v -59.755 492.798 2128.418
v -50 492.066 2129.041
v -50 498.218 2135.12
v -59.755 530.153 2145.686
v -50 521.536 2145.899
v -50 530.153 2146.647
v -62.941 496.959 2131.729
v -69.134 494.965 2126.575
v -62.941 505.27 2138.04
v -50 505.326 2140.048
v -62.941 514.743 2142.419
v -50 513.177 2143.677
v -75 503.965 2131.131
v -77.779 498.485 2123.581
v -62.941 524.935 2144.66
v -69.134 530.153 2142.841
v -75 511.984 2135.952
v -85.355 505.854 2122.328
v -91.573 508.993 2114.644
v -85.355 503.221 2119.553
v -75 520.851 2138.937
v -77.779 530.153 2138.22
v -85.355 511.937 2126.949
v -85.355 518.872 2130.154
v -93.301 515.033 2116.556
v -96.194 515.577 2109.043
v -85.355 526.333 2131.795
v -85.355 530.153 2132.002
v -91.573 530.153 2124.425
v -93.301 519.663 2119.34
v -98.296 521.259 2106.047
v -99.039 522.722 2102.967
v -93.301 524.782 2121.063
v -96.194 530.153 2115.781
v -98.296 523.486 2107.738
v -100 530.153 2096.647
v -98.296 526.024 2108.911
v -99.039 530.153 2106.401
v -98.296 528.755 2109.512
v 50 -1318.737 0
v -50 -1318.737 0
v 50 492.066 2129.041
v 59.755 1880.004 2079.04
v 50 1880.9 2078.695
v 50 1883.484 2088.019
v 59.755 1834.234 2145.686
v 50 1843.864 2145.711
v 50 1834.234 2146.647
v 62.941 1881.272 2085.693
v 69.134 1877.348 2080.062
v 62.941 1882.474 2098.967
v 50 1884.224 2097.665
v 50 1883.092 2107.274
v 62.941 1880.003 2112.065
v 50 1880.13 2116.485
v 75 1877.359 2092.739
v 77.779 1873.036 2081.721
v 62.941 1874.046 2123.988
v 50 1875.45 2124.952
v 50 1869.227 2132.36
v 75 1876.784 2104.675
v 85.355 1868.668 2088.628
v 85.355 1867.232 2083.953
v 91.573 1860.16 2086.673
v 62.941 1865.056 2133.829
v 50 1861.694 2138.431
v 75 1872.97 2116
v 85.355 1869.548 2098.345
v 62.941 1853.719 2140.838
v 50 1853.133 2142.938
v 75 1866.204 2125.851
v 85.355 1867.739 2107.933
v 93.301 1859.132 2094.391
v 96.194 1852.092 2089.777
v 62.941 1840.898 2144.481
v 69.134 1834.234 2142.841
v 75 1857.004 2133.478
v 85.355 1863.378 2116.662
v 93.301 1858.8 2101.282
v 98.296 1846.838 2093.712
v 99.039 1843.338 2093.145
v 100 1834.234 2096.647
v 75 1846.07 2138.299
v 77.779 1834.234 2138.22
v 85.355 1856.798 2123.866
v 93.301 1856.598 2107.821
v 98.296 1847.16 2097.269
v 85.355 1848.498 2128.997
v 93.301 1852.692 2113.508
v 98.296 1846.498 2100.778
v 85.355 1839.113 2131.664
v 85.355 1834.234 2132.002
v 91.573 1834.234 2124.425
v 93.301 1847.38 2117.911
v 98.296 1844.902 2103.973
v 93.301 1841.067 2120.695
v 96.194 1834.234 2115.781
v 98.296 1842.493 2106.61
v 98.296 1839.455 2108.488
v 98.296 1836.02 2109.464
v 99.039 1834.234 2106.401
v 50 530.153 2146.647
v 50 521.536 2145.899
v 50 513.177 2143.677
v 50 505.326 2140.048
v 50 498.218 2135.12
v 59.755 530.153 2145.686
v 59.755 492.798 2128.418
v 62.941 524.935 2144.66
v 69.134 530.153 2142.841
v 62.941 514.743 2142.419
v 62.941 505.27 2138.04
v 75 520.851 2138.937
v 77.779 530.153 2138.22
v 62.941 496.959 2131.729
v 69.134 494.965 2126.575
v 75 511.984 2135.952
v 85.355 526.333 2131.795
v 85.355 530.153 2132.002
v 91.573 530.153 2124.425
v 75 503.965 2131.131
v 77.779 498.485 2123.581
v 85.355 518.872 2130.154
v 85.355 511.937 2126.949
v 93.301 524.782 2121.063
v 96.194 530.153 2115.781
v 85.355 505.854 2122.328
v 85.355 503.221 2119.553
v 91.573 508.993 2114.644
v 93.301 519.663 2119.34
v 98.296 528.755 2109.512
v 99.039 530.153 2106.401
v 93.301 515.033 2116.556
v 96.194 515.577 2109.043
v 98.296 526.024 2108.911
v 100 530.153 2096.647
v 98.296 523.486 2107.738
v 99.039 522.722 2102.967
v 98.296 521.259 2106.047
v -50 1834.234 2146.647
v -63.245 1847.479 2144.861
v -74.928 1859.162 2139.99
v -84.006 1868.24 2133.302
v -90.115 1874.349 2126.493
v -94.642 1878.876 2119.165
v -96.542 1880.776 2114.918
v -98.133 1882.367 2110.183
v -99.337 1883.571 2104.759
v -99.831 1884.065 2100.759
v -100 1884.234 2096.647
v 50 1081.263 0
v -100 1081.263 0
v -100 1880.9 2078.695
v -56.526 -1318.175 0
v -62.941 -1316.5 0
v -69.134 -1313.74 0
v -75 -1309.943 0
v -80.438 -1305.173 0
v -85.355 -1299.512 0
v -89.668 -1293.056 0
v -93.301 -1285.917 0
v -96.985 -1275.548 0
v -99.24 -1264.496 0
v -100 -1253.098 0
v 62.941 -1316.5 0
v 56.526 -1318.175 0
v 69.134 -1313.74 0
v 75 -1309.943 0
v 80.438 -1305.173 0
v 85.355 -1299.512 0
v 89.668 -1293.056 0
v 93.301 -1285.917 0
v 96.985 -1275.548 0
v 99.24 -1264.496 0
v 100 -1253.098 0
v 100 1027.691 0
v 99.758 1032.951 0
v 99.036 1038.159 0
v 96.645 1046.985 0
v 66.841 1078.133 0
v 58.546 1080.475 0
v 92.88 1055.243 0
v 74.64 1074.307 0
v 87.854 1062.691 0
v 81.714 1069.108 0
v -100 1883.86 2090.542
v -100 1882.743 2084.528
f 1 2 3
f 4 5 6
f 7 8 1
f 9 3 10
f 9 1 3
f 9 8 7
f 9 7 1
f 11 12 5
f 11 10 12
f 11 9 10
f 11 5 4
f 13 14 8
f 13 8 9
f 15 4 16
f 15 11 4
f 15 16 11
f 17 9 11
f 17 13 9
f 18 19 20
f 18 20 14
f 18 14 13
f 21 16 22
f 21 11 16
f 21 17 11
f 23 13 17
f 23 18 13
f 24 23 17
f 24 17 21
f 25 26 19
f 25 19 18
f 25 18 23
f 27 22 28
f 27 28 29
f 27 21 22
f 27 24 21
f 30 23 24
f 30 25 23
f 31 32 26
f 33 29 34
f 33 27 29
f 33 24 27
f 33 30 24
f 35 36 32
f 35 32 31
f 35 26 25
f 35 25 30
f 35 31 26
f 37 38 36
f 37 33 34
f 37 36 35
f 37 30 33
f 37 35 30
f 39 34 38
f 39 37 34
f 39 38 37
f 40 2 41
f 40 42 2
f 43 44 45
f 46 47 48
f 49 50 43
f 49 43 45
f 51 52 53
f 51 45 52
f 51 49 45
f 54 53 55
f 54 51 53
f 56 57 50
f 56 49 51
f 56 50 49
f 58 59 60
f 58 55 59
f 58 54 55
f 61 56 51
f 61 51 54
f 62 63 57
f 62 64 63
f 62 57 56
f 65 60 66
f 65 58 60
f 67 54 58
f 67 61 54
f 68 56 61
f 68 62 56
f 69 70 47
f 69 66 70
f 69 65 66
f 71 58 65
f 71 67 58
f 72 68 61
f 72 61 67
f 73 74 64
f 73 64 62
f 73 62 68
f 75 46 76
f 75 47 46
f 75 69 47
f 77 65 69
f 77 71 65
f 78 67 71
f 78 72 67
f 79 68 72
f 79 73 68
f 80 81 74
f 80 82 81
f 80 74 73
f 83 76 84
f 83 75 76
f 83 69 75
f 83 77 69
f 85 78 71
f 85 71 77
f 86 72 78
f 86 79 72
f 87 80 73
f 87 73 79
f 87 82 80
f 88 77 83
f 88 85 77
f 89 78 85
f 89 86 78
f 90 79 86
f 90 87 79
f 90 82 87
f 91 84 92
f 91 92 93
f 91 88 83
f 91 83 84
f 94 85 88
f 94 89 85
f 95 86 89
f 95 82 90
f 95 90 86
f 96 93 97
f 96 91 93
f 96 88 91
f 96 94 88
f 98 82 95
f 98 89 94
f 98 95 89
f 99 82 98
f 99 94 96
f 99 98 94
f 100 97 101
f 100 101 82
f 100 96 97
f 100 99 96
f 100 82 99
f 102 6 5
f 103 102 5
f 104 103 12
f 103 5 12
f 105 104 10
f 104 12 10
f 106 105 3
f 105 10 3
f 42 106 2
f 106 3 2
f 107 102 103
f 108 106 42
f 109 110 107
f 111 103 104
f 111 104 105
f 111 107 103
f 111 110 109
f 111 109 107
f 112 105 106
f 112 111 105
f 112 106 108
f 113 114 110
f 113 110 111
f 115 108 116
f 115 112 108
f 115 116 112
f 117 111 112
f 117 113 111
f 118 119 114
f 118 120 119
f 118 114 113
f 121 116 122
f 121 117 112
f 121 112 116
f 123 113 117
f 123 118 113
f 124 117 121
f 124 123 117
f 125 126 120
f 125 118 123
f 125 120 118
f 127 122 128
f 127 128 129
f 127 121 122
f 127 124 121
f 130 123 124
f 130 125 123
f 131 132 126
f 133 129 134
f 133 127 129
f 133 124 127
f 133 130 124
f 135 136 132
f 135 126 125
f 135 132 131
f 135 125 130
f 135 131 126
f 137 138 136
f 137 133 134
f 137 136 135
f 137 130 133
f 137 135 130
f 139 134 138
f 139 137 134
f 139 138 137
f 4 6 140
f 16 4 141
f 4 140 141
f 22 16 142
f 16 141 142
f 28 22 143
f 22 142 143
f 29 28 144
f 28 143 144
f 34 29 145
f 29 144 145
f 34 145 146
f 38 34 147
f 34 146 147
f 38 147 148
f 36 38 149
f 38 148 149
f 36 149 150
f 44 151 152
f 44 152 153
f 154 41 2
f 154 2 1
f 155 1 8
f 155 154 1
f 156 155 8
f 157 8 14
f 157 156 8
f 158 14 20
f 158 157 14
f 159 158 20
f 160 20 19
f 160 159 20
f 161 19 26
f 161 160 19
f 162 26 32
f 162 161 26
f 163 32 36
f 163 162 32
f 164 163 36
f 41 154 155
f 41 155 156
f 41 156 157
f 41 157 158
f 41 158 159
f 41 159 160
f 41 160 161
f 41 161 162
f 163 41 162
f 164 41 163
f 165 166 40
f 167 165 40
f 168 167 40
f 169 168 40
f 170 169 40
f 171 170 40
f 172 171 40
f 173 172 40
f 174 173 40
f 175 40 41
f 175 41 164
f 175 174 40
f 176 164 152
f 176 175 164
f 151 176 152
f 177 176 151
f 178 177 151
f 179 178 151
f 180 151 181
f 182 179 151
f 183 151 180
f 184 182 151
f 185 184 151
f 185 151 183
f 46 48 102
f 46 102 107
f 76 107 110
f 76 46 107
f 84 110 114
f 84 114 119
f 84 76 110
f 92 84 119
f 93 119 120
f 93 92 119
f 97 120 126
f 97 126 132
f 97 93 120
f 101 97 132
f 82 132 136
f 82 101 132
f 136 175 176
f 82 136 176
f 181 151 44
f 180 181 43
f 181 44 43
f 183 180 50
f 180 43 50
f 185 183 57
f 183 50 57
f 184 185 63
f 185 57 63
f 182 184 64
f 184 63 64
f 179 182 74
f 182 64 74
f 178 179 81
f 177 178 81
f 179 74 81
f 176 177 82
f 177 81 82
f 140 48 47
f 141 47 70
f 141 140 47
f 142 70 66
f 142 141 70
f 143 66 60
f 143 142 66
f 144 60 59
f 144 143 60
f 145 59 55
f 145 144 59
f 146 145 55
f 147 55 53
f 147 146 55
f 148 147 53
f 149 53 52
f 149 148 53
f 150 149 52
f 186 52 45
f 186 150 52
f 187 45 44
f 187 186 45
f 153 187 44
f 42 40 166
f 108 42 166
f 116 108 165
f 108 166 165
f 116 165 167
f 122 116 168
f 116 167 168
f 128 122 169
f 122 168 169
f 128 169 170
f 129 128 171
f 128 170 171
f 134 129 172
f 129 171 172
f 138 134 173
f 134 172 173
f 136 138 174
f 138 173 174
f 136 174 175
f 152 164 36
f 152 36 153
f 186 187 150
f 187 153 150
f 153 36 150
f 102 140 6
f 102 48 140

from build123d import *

# Parameters (mm, degrees)
F2_DEPTH     = 100
F3_R         = 50
F4_T1_DEPTH  = 1304.0811873082
F4_T3_DEPTH  = 1501.8872234652
F4_T5_DEPTH  = 332.0150903927
F4_T7_DEPTH  = 100
F4_T12_DEPTH = 50
F4_T18_DEPTH = 50
F4_T24_DEPTH = 50


# Not quite as in the source:
# - a fillet or chamfer that OpenCascade refuses, or shapes differently, is made with other operations: its cross-section is extruded or revolved along the edge and cut away or added


with BuildPart() as f2:
    # F0 (on Right) → F2 (new body, symmetric)
    with BuildSketch(Plane.YZ):
        Polygon((507.0400096967, 2146.646806384), (-1318.7368903443, 0), (1081.2631096557, 0), (1907.0400096967, 2146.646806384), align=None)
    extrude(amount=F2_DEPTH, both=True)

    # F3
    f3_edges = [f2.edges().sort_by_distance(p)[0] for p in [
        (-100, -405.84844, 1073.323403),
        (100, -405.84844, 1073.323403),
        (100, 1494.15156, 1073.323403),
    ]]
    fillet(f3_edges, radius=F3_R)

    # F4: fillet of radius 50 on 4 edges, made by hand

    # F4_s2 → F4_t1 (cut)
    with BuildSketch(Plane.XZ.offset(-1834.2339735396)):
        with BuildLine():
            ThreePointArc((50, 2146.646806384), (85.3553390593, 2132.0021454433), (100, 2096.646806384))
            Line((100, 2096.646806384), (100, 2146.646806384))
            Line((100, 2146.646806384), (50, 2146.646806384))
        make_face()
    extrude(amount=F4_T1_DEPTH, mode=Mode.SUBTRACT)

    # F4_s4 → F4_t3 (cut)
    with BuildSketch(Plane.XZ.offset(-2032.0400096967)):
        with BuildLine():
            ThreePointArc((-50, 2146.646806384), (-85.3553390593, 2132.0021454433), (-100, 2096.646806384))
            Line((-100, 2096.646806384), (-100, 2146.646806384))
            Line((-100, 2146.646806384), (-50, 2146.646806384))
        make_face()
    extrude(amount=F4_T3_DEPTH, mode=Mode.SUBTRACT)

    # F4_s6 → F4_t5 (cut)
    with BuildSketch(Plane.YZ.offset(-282.0150903927)):
        with BuildLine():
            ThreePointArc((1834.2339735396, 2146.646806384), (1875.4503755357, 2124.9524278487), (1880.900208461, 2078.695134644))
            Line((1880.900208461, 2078.695134644), (1907.0400096967, 2146.646806384))
            Line((1907.0400096967, 2146.646806384), (1834.2339735396, 2146.646806384))
        make_face()
    extrude(amount=F4_T5_DEPTH, mode=Mode.SUBTRACT)

    # F4_s8 → F4_t7 (cut)
    with BuildSketch(Plane.YZ.offset(-50)):
        with BuildLine():
            ThreePointArc((530.1527862314, 2146.646806384), (509.1730515679, 2142.0323848583), (492.0656904737, 2129.0408357219))
            Line((492.0656904737, 2129.0408357219), (507.0400096967, 2146.646806384))
            Line((507.0400096967, 2146.646806384), (530.1527862314, 2146.646806384))
        make_face()
    extrude(amount=F4_T7_DEPTH, mode=Mode.SUBTRACT)


with BuildPart() as f4_tool10:
    # F4_s11 → F4_t12 (new body)
    with BuildSketch(Plane.YZ.offset(-50)):
        Polygon((530.1527862314, 2096.646806384), (492.0656904737, 2129.0408357219), (507.0400096967, 2146.646806384), (530.1527862314, 2146.646806384), align=None)
    extrude(amount=-F4_T12_DEPTH)

    # F4_s13 → F4_t14 (revolve, cut)
    with BuildSketch(Plane(origin=(-50, 530.1527862314, 2096.646806384), x_dir=(0, 0.4195946933, -0.9077115695), z_dir=(0, 0.9077115695, 0.4195946933))):
        with BuildLine():
            ThreePointArc((0, -50), (50, 0), (0, 50))
            Line((0, 50), (0, -50))
        make_face()
    revolve(axis=Axis((-50, 530.1527862314, 2096.646806384), (-1, 0, 0)), mode=Mode.SUBTRACT)


with BuildPart() as f2_1:
    add(f2.part)

    # F4_t9: cut F4_tool10
    add(f4_tool10.part, mode=Mode.SUBTRACT)


with BuildPart() as f4_tool16:
    # F4_s17 → F4_t18 (new body)
    with BuildSketch(Plane.YZ.offset(50)):
        Polygon((530.1527862314, 2096.646806384), (530.1527862314, 2146.646806384), (507.0400096967, 2146.646806384), (492.0656904737, 2129.0408357219), align=None)
    extrude(amount=F4_T18_DEPTH)

    # F4_s19 → F4_t20 (revolve, cut)
    with BuildSketch(Plane(origin=(50, 530.1527862314, 2096.646806384), x_dir=(0, 0.4195946933, -0.9077115695), z_dir=(0, -0.9077115695, -0.4195946933))):
        with BuildLine():
            ThreePointArc((0, -50), (50, 0), (0, 50))
            Line((0, 50), (0, -50))
        make_face()
    revolve(axis=Axis((50, 530.1527862314, 2096.646806384), (1, 0, 0)), mode=Mode.SUBTRACT)


with BuildPart() as f2_2:
    add(f2_1.part)

    # F4_t15: cut F4_tool16
    add(f4_tool16.part, mode=Mode.SUBTRACT)


with BuildPart() as f4_tool22:
    # F4_s23 → F4_t24 (new body)
    with BuildSketch(Plane.YZ.offset(50)):
        Polygon((1834.2339735396, 2096.646806384), (1834.2339735396, 2146.646806384), (1907.0400096967, 2146.646806384), (1880.900208461, 2078.695134644), align=None)
    extrude(amount=F4_T24_DEPTH)

    # F4_s25 → F4_t26 (revolve, cut)
    with BuildSketch(Plane(origin=(50, 1834.2339735396, 2096.646806384), x_dir=(0, -0.8243280399, -0.5661124293), z_dir=(0, -0.5661124293, 0.8243280399))):
        with BuildLine():
            ThreePointArc((0, -50), (50, 0), (0, 50))
            Line((0, 50), (0, -50))
        make_face()
    revolve(axis=Axis((50, 1834.2339735396, 2096.646806384), (1, 0, 0)), mode=Mode.SUBTRACT)


with BuildPart() as f2_3:
    add(f2_2.part)

    # F4_t21: cut F4_tool22
    add(f4_tool22.part, mode=Mode.SUBTRACT)


solid = f2_3.part
